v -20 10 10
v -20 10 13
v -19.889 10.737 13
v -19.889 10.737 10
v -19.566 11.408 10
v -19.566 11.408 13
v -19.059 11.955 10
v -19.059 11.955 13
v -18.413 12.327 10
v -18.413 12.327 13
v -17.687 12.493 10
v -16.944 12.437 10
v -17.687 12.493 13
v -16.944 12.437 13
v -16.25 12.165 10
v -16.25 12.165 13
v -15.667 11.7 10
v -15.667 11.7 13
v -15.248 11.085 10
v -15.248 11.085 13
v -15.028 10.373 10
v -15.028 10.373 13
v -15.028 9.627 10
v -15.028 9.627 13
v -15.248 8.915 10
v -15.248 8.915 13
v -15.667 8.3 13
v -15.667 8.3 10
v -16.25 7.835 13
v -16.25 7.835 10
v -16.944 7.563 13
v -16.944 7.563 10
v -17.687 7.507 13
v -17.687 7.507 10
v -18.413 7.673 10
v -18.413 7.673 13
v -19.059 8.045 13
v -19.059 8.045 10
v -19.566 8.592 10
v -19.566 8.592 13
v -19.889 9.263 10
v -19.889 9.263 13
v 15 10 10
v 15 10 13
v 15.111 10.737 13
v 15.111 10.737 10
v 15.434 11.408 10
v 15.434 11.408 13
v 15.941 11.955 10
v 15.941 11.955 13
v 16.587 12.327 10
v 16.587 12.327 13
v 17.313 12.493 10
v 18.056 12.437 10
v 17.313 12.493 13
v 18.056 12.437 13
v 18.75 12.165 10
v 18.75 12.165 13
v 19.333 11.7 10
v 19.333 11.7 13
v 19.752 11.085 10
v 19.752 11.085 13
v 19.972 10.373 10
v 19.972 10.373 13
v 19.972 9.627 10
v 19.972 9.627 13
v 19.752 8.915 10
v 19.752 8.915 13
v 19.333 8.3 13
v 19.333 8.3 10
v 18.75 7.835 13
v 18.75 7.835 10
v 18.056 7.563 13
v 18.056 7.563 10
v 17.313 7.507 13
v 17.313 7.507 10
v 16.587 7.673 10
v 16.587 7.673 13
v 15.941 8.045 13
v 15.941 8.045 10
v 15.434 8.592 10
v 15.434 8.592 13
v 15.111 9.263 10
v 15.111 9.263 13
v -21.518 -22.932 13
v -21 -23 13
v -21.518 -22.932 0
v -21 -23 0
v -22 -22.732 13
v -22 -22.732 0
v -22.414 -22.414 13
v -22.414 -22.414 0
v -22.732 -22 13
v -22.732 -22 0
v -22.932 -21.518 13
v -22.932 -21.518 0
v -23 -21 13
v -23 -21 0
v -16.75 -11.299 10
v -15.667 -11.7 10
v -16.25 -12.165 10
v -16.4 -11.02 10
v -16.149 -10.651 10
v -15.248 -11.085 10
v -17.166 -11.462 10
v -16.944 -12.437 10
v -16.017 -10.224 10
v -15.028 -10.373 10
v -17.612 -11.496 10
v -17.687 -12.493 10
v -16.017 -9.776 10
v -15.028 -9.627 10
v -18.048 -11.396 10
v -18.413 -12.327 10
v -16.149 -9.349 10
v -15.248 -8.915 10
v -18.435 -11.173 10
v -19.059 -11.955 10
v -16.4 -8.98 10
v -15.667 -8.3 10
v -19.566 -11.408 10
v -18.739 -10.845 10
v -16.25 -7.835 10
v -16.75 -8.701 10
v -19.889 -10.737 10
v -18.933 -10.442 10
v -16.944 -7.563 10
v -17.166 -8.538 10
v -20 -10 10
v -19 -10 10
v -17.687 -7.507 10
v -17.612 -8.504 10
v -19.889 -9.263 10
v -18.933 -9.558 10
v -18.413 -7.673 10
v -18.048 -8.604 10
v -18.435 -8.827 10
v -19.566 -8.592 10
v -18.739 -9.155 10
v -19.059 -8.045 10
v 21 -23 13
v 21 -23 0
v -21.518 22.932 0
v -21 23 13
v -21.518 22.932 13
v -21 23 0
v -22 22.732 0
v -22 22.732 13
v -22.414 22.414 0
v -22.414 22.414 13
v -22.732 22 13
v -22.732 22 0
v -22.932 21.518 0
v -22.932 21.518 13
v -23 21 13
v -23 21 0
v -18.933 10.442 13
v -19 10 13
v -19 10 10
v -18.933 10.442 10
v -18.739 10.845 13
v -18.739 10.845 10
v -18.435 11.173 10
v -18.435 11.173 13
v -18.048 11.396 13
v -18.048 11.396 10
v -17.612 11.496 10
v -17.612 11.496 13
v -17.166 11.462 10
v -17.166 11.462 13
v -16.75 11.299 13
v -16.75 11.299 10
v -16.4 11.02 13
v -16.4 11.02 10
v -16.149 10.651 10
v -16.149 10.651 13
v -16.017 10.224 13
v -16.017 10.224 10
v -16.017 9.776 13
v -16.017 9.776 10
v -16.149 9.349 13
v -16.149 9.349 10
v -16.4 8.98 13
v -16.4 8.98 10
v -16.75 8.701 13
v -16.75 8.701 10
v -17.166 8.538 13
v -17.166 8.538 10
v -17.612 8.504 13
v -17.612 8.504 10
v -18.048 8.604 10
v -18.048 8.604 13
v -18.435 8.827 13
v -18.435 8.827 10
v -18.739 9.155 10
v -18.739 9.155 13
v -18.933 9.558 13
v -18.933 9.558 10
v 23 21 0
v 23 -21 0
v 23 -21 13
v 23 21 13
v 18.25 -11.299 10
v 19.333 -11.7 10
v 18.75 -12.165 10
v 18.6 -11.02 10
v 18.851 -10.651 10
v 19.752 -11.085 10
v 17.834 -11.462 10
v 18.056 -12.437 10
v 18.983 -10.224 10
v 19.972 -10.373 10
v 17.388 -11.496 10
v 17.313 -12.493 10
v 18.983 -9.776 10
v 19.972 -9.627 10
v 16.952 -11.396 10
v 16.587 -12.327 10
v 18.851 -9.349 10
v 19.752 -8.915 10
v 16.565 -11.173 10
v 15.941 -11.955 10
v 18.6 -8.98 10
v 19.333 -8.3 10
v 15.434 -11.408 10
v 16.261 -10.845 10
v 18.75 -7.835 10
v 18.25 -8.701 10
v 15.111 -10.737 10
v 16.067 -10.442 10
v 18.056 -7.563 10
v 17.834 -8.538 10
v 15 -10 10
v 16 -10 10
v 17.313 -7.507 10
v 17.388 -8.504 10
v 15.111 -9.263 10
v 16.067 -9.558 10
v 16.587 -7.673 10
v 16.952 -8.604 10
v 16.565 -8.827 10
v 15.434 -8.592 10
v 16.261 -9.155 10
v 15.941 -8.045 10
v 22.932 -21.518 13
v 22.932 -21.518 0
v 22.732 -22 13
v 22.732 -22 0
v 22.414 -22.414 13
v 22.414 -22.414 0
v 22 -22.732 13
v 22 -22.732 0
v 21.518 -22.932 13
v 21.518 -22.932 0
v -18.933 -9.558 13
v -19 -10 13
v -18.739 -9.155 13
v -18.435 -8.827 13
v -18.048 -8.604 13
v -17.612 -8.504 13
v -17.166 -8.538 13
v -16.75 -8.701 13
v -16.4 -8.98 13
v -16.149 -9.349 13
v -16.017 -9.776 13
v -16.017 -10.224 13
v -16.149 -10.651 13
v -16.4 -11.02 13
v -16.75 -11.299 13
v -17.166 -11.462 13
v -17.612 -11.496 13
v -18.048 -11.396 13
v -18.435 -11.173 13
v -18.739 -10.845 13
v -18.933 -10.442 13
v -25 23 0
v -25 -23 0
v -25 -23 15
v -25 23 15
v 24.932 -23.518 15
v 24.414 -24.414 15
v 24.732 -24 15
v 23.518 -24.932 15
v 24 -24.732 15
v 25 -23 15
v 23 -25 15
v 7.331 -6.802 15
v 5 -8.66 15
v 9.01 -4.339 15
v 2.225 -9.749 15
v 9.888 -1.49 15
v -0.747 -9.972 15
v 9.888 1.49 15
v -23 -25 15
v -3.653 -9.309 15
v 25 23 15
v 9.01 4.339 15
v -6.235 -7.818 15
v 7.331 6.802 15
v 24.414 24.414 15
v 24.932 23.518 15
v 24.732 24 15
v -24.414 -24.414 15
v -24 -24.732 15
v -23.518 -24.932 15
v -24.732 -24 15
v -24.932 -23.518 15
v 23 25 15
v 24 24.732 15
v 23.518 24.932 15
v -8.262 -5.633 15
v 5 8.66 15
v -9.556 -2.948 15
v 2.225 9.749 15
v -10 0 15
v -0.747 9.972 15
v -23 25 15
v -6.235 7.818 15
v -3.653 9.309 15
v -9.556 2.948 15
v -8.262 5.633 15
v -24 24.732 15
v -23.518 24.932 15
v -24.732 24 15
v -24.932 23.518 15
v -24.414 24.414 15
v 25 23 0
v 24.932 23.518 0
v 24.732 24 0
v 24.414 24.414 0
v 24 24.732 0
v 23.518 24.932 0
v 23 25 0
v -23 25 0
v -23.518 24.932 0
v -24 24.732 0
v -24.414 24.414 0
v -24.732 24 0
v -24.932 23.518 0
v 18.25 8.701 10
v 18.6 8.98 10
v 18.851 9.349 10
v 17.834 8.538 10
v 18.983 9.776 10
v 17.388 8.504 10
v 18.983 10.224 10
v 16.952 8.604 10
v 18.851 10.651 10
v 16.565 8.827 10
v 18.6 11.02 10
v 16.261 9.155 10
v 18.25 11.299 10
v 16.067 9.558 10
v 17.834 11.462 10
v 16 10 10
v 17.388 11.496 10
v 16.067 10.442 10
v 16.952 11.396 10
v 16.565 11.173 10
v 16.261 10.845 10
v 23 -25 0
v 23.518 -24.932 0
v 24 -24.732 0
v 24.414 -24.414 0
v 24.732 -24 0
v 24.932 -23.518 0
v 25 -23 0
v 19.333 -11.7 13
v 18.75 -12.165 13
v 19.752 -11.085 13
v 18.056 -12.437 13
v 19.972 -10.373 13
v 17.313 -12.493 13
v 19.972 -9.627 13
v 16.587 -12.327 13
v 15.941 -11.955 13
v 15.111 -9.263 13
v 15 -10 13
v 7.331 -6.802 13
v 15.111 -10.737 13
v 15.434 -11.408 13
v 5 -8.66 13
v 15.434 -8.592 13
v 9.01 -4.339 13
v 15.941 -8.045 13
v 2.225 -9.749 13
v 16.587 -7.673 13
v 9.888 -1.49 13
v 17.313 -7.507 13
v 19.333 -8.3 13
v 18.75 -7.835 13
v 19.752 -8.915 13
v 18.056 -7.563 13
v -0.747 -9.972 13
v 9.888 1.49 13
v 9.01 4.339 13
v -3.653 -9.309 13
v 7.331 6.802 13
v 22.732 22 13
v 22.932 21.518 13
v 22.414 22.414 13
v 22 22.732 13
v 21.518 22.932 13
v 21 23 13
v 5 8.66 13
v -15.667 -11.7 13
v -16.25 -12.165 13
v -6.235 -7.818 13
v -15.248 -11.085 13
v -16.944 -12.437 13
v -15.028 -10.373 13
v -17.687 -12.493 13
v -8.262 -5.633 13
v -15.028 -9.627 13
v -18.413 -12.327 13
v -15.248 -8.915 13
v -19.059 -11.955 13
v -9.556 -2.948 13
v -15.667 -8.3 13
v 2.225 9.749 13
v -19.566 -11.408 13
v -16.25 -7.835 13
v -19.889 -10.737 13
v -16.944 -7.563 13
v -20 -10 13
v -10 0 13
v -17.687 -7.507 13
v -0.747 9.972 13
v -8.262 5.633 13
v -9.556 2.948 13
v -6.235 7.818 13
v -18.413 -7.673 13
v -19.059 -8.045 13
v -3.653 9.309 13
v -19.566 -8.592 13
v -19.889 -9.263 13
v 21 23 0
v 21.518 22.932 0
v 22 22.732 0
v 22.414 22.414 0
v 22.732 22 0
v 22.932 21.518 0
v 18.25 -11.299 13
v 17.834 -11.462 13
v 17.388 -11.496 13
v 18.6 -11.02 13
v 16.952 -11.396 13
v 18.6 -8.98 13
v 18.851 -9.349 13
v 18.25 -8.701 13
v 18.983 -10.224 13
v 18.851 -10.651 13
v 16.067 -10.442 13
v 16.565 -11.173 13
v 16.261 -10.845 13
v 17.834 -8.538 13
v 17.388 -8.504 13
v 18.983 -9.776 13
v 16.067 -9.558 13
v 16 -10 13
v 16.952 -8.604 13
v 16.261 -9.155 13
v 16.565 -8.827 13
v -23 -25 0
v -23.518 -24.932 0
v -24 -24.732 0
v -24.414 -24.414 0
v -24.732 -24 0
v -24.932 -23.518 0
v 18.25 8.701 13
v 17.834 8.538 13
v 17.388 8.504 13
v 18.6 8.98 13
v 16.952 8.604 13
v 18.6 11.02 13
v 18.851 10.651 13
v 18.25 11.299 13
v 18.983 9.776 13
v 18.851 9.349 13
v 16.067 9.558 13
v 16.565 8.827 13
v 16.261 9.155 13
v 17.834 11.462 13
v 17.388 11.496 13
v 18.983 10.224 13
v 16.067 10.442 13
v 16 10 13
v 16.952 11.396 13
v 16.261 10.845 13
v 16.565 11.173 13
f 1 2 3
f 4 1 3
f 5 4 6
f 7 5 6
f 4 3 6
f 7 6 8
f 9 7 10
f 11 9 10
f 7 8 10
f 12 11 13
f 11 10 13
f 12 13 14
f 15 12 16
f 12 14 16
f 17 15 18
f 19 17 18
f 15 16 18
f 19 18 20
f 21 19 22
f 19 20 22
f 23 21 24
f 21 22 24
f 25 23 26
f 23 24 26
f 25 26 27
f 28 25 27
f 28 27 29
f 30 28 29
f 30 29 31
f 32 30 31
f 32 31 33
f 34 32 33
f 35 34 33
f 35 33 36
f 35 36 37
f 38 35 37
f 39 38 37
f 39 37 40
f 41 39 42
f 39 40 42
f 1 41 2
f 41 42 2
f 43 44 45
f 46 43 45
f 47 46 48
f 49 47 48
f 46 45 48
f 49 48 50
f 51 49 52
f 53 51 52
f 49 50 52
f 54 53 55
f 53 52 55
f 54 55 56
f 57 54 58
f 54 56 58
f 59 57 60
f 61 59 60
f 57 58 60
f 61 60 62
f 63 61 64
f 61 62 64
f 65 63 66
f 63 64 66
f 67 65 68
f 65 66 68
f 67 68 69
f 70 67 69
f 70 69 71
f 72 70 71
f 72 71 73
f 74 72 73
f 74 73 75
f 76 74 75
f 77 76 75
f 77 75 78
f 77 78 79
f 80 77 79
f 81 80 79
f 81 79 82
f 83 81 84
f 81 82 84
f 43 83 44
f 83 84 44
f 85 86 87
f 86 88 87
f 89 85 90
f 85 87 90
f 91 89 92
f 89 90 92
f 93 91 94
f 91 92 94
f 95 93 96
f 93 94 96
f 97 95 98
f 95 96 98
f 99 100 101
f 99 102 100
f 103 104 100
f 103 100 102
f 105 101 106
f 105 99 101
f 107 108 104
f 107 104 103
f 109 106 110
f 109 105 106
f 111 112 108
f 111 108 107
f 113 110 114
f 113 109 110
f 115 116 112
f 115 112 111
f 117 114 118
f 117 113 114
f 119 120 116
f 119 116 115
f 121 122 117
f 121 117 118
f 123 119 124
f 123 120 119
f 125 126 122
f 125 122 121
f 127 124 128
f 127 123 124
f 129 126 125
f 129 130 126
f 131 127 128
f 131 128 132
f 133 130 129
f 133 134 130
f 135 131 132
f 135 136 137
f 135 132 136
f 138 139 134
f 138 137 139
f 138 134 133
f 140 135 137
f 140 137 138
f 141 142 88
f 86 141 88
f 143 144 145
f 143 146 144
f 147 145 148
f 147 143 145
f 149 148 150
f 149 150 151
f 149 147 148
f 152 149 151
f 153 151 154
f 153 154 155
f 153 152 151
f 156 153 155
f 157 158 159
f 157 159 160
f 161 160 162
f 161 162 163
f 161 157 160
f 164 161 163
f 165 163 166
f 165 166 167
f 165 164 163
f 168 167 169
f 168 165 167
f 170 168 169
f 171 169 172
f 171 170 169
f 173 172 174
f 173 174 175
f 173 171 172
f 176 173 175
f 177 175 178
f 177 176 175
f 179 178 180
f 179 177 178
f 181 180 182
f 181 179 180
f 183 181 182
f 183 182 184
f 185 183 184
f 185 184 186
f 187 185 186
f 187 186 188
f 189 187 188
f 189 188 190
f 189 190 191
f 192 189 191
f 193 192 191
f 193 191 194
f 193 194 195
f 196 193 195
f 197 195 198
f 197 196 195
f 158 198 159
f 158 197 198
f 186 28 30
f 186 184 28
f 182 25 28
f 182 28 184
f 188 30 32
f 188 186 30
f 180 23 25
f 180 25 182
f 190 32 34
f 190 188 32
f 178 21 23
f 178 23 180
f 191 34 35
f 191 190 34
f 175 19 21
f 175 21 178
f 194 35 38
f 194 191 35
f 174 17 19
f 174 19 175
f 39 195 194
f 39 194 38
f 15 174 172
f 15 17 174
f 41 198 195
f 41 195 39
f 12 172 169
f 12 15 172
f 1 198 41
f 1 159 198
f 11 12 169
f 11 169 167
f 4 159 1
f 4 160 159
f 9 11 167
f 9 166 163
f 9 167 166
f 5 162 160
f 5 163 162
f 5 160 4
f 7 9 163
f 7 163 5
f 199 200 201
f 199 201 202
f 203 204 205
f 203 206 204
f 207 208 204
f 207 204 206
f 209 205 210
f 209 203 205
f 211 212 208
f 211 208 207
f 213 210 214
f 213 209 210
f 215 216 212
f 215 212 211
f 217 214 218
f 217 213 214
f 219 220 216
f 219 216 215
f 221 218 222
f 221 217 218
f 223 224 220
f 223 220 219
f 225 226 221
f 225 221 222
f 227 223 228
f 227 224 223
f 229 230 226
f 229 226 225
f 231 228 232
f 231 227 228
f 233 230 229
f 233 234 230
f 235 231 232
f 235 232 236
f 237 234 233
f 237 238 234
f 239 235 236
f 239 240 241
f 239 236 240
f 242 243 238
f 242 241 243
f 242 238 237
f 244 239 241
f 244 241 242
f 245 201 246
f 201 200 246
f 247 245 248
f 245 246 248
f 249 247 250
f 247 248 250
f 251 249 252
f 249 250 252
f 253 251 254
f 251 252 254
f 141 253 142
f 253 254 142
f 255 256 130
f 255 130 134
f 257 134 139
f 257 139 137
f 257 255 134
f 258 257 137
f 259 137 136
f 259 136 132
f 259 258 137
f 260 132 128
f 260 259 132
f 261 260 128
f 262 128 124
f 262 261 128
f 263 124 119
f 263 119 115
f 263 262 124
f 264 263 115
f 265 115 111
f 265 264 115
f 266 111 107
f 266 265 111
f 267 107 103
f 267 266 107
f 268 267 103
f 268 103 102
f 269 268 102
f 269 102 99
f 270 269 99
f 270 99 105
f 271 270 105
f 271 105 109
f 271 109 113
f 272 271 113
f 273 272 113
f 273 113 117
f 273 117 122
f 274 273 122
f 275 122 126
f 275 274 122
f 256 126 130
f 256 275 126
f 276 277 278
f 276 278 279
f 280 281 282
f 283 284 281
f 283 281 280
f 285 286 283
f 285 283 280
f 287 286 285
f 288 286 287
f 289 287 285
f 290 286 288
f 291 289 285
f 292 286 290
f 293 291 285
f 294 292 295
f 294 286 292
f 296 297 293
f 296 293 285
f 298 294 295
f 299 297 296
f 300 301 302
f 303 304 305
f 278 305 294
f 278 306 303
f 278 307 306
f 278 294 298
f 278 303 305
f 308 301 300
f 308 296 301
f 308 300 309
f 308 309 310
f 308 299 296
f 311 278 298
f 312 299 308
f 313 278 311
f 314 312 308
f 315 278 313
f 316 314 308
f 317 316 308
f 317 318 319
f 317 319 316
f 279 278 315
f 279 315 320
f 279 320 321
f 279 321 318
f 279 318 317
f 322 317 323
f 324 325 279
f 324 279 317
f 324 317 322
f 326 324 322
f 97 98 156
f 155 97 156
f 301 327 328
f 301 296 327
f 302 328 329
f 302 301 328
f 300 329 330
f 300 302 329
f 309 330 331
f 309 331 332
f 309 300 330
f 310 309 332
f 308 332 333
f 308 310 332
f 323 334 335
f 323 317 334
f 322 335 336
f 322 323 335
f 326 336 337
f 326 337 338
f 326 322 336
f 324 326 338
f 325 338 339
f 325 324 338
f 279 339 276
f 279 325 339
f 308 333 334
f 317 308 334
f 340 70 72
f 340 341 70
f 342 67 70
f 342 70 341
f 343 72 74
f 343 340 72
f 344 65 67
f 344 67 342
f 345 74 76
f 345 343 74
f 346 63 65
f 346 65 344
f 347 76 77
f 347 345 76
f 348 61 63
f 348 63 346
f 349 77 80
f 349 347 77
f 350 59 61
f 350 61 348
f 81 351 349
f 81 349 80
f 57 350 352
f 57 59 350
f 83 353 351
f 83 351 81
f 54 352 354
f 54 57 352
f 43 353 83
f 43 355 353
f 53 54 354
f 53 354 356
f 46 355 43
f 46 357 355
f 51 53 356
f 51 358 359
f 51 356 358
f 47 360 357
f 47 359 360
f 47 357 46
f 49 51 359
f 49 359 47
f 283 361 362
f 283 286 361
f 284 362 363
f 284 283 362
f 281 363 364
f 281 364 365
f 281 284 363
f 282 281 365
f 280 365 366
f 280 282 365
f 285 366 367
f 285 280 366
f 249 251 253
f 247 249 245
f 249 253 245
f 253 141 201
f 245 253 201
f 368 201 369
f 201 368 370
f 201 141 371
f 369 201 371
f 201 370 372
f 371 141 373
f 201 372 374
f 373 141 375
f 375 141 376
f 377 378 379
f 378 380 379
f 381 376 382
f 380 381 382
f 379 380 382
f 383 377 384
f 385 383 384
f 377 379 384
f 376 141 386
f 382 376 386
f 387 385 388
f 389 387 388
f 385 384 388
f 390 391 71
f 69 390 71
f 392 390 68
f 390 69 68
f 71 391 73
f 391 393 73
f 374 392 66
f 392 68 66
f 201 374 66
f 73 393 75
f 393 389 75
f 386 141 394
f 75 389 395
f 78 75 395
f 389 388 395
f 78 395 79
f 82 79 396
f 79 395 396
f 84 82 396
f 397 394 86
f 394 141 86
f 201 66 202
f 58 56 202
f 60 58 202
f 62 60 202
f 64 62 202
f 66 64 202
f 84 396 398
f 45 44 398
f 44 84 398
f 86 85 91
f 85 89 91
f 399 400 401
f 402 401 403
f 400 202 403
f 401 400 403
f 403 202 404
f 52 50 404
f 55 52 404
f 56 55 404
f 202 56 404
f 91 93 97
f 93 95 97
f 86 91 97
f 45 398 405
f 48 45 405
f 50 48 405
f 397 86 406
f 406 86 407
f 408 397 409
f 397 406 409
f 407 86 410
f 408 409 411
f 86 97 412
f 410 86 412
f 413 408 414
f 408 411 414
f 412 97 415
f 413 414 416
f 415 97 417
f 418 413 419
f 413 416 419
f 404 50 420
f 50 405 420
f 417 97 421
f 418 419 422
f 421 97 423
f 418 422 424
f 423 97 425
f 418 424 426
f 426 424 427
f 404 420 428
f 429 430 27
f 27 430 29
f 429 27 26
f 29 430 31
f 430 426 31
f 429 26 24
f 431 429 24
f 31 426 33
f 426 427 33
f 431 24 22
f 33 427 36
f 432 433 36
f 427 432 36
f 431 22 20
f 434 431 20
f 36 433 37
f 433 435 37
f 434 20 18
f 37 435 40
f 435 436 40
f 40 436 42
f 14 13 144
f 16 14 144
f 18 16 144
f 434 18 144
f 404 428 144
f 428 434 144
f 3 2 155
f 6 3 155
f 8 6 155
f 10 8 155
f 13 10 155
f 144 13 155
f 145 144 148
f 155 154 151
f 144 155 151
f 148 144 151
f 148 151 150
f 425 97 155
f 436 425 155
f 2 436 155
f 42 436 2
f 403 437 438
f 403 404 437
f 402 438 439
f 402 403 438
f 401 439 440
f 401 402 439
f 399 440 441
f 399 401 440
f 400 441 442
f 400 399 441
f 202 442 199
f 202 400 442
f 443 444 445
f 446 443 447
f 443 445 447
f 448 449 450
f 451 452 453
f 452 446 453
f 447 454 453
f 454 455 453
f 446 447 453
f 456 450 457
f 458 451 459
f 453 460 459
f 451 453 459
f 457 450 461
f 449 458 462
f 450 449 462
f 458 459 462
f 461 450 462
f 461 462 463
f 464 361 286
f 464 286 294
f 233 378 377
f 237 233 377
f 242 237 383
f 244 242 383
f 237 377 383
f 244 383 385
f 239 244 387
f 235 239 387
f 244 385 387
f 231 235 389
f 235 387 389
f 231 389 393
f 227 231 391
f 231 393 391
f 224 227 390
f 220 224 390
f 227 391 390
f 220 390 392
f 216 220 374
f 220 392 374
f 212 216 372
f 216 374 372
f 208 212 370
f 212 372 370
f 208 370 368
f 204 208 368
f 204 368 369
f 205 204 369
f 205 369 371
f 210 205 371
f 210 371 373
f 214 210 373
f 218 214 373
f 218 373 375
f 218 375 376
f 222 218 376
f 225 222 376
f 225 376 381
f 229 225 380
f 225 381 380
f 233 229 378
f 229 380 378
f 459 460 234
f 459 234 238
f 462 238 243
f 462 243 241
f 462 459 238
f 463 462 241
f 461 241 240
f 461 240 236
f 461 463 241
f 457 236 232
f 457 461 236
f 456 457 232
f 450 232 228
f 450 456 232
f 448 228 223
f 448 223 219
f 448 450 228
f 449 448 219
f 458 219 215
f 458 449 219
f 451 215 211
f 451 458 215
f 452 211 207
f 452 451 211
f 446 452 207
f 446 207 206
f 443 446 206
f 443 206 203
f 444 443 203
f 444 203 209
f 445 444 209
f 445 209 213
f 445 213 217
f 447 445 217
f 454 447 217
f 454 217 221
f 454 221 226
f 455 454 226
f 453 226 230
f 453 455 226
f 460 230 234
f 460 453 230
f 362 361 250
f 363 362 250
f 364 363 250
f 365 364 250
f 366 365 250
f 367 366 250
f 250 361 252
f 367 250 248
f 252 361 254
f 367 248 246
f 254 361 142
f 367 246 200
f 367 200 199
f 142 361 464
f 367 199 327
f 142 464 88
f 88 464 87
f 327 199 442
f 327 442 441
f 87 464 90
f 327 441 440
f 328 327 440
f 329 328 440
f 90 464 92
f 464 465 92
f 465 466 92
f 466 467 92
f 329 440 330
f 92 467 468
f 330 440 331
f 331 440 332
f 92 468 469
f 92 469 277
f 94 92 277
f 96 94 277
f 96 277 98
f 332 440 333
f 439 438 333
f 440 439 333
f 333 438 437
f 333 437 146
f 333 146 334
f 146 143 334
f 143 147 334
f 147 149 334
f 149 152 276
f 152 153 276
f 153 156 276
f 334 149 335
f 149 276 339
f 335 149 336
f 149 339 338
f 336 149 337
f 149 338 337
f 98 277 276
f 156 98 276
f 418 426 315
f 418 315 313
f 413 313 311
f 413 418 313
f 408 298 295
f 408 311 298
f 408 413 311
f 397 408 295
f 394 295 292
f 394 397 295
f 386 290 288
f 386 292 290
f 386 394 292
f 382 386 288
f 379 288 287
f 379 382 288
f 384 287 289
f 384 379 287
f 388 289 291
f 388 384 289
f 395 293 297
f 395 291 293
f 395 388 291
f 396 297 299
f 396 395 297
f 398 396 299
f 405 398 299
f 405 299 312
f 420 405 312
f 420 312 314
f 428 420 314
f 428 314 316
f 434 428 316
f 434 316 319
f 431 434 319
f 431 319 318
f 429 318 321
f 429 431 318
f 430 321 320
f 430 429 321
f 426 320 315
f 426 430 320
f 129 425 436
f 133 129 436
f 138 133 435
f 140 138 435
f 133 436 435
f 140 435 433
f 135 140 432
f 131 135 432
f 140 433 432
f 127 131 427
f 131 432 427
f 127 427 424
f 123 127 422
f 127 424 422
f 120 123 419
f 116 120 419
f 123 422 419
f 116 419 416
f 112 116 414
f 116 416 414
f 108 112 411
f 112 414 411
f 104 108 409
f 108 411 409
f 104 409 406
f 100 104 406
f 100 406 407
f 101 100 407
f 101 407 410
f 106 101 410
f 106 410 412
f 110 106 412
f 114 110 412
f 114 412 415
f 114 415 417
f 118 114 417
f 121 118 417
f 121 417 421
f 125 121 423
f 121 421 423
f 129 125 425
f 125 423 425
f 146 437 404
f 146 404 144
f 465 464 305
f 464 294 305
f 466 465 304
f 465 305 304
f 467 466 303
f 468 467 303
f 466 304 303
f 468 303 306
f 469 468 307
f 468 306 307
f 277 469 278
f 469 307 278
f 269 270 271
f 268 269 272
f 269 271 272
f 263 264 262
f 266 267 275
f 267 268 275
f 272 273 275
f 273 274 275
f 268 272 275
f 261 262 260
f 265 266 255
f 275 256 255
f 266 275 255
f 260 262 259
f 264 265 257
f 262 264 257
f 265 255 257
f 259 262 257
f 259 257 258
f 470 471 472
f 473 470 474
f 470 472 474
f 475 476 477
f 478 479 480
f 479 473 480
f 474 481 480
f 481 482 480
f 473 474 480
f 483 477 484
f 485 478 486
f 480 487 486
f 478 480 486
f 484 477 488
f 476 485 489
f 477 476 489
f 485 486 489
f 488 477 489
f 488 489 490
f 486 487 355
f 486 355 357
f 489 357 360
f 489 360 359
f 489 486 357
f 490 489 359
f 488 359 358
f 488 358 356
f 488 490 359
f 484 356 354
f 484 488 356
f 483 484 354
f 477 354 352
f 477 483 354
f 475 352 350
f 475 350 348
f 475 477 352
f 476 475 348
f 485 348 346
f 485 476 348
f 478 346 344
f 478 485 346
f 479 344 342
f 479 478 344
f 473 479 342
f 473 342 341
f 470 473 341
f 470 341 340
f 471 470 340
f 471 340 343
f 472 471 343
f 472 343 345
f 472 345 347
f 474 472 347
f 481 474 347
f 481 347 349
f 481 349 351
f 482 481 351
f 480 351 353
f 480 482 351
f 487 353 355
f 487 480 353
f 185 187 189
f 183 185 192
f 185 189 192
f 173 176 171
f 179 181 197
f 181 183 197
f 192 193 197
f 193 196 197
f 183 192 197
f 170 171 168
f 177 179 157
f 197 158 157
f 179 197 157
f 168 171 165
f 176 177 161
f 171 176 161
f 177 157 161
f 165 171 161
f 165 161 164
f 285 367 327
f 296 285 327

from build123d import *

# Parameters (mm, degrees)
SKETCH1_W               = 50
SKETCH1_H               = 50
BOSS_EXTRUDE1_DEPTH     = 15
SHELL2_T                = -2
CUT_EXTRUDE1_DEPTH      = 39.405728739
CUT_EXTRUDE1_DEPTH_BACK = 39.405728739
SKETCH3_R               = 10
FILLET1_R               = 2
FILLET3_R               = 2
SKETCH5_R               = 2.5
SKETCH5_R_2             = 1.5
BOSS_EXTRUDE2_DEPTH     = 3
LPATTERN2_COUNT         = 2
LPATTERN2_PITCH         = 20
LPATTERN2_COUNT_DIR2    = 2
LPATTERN2_PITCH_DIR2    = 35


with BuildPart() as part:
    # Sketch1 → Boss-Extrude1 (new body)
    with BuildSketch(Plane(origin=(0, 0, 0), x_dir=(0, 1, 0), z_dir=(0, 0, 1))):
        Rectangle(SKETCH1_W, SKETCH1_H)
    extrude(amount=BOSS_EXTRUDE1_DEPTH)

    # Shell2
    shell2_openings = [part.faces().sort_by_distance(p)[0] for p in [
        (0, 0, 0),
    ]]
    offset(amount=SHELL2_T, openings=shell2_openings, kind=Kind.INTERSECTION)

    # Sketch3 → Cut-Extrude1 (cut, two sides: drawn at the far end of the back side and taken through both)
    with BuildSketch(Plane.XY.offset(15).offset(-CUT_EXTRUDE1_DEPTH_BACK)):
        with Locations(Location((0, 0, 0), (0, 0, 180))):
            Circle(SKETCH3_R)
    extrude(amount=CUT_EXTRUDE1_DEPTH + CUT_EXTRUDE1_DEPTH_BACK, mode=Mode.SUBTRACT)

    # Fillet1
    fillet1_edges = [part.edges().sort_by_distance(p)[0] for p in [
        (23, 23, 6.5),
        (-23, 23, 6.5),
        (-23, -23, 6.5),
        (23, -23, 6.5),
    ]]
    fillet(fillet1_edges, radius=FILLET1_R)

    # Fillet3
    fillet3_edges = [part.edges().sort_by_distance(p)[0] for p in [
        (25, 25, 7.5),
        (25, -25, 7.5),
        (-25, -25, 7.5),
        (-25, 25, 7.5),
    ]]
    fillet(fillet3_edges, radius=FILLET3_R)

    # Sketch5 → Boss-Extrude2 (add)
    with BuildSketch(Plane(origin=(0, 0, 13), x_dir=(1, 0, 0), z_dir=(0, 0, -1))):
        with Locations(Location((17.5, 10, 0), (0, 0, 180))):
            Circle(SKETCH5_R)
        with Locations(Location((17.5, 10, 0), (0, 0, 180))):
            Circle(SKETCH5_R_2, mode=Mode.SUBTRACT)
    boss_extrude2 = extrude(amount=BOSS_EXTRUDE2_DEPTH)

    # LPattern2: Boss-Extrude2 2 × 2
    with Locations(*[(-j * LPATTERN2_PITCH_DIR2, i * LPATTERN2_PITCH, 0) for i in range(LPATTERN2_COUNT) for j in range(LPATTERN2_COUNT_DIR2) if (i, j) != (0, 0)]):
        add(boss_extrude2)


solid = part.part
